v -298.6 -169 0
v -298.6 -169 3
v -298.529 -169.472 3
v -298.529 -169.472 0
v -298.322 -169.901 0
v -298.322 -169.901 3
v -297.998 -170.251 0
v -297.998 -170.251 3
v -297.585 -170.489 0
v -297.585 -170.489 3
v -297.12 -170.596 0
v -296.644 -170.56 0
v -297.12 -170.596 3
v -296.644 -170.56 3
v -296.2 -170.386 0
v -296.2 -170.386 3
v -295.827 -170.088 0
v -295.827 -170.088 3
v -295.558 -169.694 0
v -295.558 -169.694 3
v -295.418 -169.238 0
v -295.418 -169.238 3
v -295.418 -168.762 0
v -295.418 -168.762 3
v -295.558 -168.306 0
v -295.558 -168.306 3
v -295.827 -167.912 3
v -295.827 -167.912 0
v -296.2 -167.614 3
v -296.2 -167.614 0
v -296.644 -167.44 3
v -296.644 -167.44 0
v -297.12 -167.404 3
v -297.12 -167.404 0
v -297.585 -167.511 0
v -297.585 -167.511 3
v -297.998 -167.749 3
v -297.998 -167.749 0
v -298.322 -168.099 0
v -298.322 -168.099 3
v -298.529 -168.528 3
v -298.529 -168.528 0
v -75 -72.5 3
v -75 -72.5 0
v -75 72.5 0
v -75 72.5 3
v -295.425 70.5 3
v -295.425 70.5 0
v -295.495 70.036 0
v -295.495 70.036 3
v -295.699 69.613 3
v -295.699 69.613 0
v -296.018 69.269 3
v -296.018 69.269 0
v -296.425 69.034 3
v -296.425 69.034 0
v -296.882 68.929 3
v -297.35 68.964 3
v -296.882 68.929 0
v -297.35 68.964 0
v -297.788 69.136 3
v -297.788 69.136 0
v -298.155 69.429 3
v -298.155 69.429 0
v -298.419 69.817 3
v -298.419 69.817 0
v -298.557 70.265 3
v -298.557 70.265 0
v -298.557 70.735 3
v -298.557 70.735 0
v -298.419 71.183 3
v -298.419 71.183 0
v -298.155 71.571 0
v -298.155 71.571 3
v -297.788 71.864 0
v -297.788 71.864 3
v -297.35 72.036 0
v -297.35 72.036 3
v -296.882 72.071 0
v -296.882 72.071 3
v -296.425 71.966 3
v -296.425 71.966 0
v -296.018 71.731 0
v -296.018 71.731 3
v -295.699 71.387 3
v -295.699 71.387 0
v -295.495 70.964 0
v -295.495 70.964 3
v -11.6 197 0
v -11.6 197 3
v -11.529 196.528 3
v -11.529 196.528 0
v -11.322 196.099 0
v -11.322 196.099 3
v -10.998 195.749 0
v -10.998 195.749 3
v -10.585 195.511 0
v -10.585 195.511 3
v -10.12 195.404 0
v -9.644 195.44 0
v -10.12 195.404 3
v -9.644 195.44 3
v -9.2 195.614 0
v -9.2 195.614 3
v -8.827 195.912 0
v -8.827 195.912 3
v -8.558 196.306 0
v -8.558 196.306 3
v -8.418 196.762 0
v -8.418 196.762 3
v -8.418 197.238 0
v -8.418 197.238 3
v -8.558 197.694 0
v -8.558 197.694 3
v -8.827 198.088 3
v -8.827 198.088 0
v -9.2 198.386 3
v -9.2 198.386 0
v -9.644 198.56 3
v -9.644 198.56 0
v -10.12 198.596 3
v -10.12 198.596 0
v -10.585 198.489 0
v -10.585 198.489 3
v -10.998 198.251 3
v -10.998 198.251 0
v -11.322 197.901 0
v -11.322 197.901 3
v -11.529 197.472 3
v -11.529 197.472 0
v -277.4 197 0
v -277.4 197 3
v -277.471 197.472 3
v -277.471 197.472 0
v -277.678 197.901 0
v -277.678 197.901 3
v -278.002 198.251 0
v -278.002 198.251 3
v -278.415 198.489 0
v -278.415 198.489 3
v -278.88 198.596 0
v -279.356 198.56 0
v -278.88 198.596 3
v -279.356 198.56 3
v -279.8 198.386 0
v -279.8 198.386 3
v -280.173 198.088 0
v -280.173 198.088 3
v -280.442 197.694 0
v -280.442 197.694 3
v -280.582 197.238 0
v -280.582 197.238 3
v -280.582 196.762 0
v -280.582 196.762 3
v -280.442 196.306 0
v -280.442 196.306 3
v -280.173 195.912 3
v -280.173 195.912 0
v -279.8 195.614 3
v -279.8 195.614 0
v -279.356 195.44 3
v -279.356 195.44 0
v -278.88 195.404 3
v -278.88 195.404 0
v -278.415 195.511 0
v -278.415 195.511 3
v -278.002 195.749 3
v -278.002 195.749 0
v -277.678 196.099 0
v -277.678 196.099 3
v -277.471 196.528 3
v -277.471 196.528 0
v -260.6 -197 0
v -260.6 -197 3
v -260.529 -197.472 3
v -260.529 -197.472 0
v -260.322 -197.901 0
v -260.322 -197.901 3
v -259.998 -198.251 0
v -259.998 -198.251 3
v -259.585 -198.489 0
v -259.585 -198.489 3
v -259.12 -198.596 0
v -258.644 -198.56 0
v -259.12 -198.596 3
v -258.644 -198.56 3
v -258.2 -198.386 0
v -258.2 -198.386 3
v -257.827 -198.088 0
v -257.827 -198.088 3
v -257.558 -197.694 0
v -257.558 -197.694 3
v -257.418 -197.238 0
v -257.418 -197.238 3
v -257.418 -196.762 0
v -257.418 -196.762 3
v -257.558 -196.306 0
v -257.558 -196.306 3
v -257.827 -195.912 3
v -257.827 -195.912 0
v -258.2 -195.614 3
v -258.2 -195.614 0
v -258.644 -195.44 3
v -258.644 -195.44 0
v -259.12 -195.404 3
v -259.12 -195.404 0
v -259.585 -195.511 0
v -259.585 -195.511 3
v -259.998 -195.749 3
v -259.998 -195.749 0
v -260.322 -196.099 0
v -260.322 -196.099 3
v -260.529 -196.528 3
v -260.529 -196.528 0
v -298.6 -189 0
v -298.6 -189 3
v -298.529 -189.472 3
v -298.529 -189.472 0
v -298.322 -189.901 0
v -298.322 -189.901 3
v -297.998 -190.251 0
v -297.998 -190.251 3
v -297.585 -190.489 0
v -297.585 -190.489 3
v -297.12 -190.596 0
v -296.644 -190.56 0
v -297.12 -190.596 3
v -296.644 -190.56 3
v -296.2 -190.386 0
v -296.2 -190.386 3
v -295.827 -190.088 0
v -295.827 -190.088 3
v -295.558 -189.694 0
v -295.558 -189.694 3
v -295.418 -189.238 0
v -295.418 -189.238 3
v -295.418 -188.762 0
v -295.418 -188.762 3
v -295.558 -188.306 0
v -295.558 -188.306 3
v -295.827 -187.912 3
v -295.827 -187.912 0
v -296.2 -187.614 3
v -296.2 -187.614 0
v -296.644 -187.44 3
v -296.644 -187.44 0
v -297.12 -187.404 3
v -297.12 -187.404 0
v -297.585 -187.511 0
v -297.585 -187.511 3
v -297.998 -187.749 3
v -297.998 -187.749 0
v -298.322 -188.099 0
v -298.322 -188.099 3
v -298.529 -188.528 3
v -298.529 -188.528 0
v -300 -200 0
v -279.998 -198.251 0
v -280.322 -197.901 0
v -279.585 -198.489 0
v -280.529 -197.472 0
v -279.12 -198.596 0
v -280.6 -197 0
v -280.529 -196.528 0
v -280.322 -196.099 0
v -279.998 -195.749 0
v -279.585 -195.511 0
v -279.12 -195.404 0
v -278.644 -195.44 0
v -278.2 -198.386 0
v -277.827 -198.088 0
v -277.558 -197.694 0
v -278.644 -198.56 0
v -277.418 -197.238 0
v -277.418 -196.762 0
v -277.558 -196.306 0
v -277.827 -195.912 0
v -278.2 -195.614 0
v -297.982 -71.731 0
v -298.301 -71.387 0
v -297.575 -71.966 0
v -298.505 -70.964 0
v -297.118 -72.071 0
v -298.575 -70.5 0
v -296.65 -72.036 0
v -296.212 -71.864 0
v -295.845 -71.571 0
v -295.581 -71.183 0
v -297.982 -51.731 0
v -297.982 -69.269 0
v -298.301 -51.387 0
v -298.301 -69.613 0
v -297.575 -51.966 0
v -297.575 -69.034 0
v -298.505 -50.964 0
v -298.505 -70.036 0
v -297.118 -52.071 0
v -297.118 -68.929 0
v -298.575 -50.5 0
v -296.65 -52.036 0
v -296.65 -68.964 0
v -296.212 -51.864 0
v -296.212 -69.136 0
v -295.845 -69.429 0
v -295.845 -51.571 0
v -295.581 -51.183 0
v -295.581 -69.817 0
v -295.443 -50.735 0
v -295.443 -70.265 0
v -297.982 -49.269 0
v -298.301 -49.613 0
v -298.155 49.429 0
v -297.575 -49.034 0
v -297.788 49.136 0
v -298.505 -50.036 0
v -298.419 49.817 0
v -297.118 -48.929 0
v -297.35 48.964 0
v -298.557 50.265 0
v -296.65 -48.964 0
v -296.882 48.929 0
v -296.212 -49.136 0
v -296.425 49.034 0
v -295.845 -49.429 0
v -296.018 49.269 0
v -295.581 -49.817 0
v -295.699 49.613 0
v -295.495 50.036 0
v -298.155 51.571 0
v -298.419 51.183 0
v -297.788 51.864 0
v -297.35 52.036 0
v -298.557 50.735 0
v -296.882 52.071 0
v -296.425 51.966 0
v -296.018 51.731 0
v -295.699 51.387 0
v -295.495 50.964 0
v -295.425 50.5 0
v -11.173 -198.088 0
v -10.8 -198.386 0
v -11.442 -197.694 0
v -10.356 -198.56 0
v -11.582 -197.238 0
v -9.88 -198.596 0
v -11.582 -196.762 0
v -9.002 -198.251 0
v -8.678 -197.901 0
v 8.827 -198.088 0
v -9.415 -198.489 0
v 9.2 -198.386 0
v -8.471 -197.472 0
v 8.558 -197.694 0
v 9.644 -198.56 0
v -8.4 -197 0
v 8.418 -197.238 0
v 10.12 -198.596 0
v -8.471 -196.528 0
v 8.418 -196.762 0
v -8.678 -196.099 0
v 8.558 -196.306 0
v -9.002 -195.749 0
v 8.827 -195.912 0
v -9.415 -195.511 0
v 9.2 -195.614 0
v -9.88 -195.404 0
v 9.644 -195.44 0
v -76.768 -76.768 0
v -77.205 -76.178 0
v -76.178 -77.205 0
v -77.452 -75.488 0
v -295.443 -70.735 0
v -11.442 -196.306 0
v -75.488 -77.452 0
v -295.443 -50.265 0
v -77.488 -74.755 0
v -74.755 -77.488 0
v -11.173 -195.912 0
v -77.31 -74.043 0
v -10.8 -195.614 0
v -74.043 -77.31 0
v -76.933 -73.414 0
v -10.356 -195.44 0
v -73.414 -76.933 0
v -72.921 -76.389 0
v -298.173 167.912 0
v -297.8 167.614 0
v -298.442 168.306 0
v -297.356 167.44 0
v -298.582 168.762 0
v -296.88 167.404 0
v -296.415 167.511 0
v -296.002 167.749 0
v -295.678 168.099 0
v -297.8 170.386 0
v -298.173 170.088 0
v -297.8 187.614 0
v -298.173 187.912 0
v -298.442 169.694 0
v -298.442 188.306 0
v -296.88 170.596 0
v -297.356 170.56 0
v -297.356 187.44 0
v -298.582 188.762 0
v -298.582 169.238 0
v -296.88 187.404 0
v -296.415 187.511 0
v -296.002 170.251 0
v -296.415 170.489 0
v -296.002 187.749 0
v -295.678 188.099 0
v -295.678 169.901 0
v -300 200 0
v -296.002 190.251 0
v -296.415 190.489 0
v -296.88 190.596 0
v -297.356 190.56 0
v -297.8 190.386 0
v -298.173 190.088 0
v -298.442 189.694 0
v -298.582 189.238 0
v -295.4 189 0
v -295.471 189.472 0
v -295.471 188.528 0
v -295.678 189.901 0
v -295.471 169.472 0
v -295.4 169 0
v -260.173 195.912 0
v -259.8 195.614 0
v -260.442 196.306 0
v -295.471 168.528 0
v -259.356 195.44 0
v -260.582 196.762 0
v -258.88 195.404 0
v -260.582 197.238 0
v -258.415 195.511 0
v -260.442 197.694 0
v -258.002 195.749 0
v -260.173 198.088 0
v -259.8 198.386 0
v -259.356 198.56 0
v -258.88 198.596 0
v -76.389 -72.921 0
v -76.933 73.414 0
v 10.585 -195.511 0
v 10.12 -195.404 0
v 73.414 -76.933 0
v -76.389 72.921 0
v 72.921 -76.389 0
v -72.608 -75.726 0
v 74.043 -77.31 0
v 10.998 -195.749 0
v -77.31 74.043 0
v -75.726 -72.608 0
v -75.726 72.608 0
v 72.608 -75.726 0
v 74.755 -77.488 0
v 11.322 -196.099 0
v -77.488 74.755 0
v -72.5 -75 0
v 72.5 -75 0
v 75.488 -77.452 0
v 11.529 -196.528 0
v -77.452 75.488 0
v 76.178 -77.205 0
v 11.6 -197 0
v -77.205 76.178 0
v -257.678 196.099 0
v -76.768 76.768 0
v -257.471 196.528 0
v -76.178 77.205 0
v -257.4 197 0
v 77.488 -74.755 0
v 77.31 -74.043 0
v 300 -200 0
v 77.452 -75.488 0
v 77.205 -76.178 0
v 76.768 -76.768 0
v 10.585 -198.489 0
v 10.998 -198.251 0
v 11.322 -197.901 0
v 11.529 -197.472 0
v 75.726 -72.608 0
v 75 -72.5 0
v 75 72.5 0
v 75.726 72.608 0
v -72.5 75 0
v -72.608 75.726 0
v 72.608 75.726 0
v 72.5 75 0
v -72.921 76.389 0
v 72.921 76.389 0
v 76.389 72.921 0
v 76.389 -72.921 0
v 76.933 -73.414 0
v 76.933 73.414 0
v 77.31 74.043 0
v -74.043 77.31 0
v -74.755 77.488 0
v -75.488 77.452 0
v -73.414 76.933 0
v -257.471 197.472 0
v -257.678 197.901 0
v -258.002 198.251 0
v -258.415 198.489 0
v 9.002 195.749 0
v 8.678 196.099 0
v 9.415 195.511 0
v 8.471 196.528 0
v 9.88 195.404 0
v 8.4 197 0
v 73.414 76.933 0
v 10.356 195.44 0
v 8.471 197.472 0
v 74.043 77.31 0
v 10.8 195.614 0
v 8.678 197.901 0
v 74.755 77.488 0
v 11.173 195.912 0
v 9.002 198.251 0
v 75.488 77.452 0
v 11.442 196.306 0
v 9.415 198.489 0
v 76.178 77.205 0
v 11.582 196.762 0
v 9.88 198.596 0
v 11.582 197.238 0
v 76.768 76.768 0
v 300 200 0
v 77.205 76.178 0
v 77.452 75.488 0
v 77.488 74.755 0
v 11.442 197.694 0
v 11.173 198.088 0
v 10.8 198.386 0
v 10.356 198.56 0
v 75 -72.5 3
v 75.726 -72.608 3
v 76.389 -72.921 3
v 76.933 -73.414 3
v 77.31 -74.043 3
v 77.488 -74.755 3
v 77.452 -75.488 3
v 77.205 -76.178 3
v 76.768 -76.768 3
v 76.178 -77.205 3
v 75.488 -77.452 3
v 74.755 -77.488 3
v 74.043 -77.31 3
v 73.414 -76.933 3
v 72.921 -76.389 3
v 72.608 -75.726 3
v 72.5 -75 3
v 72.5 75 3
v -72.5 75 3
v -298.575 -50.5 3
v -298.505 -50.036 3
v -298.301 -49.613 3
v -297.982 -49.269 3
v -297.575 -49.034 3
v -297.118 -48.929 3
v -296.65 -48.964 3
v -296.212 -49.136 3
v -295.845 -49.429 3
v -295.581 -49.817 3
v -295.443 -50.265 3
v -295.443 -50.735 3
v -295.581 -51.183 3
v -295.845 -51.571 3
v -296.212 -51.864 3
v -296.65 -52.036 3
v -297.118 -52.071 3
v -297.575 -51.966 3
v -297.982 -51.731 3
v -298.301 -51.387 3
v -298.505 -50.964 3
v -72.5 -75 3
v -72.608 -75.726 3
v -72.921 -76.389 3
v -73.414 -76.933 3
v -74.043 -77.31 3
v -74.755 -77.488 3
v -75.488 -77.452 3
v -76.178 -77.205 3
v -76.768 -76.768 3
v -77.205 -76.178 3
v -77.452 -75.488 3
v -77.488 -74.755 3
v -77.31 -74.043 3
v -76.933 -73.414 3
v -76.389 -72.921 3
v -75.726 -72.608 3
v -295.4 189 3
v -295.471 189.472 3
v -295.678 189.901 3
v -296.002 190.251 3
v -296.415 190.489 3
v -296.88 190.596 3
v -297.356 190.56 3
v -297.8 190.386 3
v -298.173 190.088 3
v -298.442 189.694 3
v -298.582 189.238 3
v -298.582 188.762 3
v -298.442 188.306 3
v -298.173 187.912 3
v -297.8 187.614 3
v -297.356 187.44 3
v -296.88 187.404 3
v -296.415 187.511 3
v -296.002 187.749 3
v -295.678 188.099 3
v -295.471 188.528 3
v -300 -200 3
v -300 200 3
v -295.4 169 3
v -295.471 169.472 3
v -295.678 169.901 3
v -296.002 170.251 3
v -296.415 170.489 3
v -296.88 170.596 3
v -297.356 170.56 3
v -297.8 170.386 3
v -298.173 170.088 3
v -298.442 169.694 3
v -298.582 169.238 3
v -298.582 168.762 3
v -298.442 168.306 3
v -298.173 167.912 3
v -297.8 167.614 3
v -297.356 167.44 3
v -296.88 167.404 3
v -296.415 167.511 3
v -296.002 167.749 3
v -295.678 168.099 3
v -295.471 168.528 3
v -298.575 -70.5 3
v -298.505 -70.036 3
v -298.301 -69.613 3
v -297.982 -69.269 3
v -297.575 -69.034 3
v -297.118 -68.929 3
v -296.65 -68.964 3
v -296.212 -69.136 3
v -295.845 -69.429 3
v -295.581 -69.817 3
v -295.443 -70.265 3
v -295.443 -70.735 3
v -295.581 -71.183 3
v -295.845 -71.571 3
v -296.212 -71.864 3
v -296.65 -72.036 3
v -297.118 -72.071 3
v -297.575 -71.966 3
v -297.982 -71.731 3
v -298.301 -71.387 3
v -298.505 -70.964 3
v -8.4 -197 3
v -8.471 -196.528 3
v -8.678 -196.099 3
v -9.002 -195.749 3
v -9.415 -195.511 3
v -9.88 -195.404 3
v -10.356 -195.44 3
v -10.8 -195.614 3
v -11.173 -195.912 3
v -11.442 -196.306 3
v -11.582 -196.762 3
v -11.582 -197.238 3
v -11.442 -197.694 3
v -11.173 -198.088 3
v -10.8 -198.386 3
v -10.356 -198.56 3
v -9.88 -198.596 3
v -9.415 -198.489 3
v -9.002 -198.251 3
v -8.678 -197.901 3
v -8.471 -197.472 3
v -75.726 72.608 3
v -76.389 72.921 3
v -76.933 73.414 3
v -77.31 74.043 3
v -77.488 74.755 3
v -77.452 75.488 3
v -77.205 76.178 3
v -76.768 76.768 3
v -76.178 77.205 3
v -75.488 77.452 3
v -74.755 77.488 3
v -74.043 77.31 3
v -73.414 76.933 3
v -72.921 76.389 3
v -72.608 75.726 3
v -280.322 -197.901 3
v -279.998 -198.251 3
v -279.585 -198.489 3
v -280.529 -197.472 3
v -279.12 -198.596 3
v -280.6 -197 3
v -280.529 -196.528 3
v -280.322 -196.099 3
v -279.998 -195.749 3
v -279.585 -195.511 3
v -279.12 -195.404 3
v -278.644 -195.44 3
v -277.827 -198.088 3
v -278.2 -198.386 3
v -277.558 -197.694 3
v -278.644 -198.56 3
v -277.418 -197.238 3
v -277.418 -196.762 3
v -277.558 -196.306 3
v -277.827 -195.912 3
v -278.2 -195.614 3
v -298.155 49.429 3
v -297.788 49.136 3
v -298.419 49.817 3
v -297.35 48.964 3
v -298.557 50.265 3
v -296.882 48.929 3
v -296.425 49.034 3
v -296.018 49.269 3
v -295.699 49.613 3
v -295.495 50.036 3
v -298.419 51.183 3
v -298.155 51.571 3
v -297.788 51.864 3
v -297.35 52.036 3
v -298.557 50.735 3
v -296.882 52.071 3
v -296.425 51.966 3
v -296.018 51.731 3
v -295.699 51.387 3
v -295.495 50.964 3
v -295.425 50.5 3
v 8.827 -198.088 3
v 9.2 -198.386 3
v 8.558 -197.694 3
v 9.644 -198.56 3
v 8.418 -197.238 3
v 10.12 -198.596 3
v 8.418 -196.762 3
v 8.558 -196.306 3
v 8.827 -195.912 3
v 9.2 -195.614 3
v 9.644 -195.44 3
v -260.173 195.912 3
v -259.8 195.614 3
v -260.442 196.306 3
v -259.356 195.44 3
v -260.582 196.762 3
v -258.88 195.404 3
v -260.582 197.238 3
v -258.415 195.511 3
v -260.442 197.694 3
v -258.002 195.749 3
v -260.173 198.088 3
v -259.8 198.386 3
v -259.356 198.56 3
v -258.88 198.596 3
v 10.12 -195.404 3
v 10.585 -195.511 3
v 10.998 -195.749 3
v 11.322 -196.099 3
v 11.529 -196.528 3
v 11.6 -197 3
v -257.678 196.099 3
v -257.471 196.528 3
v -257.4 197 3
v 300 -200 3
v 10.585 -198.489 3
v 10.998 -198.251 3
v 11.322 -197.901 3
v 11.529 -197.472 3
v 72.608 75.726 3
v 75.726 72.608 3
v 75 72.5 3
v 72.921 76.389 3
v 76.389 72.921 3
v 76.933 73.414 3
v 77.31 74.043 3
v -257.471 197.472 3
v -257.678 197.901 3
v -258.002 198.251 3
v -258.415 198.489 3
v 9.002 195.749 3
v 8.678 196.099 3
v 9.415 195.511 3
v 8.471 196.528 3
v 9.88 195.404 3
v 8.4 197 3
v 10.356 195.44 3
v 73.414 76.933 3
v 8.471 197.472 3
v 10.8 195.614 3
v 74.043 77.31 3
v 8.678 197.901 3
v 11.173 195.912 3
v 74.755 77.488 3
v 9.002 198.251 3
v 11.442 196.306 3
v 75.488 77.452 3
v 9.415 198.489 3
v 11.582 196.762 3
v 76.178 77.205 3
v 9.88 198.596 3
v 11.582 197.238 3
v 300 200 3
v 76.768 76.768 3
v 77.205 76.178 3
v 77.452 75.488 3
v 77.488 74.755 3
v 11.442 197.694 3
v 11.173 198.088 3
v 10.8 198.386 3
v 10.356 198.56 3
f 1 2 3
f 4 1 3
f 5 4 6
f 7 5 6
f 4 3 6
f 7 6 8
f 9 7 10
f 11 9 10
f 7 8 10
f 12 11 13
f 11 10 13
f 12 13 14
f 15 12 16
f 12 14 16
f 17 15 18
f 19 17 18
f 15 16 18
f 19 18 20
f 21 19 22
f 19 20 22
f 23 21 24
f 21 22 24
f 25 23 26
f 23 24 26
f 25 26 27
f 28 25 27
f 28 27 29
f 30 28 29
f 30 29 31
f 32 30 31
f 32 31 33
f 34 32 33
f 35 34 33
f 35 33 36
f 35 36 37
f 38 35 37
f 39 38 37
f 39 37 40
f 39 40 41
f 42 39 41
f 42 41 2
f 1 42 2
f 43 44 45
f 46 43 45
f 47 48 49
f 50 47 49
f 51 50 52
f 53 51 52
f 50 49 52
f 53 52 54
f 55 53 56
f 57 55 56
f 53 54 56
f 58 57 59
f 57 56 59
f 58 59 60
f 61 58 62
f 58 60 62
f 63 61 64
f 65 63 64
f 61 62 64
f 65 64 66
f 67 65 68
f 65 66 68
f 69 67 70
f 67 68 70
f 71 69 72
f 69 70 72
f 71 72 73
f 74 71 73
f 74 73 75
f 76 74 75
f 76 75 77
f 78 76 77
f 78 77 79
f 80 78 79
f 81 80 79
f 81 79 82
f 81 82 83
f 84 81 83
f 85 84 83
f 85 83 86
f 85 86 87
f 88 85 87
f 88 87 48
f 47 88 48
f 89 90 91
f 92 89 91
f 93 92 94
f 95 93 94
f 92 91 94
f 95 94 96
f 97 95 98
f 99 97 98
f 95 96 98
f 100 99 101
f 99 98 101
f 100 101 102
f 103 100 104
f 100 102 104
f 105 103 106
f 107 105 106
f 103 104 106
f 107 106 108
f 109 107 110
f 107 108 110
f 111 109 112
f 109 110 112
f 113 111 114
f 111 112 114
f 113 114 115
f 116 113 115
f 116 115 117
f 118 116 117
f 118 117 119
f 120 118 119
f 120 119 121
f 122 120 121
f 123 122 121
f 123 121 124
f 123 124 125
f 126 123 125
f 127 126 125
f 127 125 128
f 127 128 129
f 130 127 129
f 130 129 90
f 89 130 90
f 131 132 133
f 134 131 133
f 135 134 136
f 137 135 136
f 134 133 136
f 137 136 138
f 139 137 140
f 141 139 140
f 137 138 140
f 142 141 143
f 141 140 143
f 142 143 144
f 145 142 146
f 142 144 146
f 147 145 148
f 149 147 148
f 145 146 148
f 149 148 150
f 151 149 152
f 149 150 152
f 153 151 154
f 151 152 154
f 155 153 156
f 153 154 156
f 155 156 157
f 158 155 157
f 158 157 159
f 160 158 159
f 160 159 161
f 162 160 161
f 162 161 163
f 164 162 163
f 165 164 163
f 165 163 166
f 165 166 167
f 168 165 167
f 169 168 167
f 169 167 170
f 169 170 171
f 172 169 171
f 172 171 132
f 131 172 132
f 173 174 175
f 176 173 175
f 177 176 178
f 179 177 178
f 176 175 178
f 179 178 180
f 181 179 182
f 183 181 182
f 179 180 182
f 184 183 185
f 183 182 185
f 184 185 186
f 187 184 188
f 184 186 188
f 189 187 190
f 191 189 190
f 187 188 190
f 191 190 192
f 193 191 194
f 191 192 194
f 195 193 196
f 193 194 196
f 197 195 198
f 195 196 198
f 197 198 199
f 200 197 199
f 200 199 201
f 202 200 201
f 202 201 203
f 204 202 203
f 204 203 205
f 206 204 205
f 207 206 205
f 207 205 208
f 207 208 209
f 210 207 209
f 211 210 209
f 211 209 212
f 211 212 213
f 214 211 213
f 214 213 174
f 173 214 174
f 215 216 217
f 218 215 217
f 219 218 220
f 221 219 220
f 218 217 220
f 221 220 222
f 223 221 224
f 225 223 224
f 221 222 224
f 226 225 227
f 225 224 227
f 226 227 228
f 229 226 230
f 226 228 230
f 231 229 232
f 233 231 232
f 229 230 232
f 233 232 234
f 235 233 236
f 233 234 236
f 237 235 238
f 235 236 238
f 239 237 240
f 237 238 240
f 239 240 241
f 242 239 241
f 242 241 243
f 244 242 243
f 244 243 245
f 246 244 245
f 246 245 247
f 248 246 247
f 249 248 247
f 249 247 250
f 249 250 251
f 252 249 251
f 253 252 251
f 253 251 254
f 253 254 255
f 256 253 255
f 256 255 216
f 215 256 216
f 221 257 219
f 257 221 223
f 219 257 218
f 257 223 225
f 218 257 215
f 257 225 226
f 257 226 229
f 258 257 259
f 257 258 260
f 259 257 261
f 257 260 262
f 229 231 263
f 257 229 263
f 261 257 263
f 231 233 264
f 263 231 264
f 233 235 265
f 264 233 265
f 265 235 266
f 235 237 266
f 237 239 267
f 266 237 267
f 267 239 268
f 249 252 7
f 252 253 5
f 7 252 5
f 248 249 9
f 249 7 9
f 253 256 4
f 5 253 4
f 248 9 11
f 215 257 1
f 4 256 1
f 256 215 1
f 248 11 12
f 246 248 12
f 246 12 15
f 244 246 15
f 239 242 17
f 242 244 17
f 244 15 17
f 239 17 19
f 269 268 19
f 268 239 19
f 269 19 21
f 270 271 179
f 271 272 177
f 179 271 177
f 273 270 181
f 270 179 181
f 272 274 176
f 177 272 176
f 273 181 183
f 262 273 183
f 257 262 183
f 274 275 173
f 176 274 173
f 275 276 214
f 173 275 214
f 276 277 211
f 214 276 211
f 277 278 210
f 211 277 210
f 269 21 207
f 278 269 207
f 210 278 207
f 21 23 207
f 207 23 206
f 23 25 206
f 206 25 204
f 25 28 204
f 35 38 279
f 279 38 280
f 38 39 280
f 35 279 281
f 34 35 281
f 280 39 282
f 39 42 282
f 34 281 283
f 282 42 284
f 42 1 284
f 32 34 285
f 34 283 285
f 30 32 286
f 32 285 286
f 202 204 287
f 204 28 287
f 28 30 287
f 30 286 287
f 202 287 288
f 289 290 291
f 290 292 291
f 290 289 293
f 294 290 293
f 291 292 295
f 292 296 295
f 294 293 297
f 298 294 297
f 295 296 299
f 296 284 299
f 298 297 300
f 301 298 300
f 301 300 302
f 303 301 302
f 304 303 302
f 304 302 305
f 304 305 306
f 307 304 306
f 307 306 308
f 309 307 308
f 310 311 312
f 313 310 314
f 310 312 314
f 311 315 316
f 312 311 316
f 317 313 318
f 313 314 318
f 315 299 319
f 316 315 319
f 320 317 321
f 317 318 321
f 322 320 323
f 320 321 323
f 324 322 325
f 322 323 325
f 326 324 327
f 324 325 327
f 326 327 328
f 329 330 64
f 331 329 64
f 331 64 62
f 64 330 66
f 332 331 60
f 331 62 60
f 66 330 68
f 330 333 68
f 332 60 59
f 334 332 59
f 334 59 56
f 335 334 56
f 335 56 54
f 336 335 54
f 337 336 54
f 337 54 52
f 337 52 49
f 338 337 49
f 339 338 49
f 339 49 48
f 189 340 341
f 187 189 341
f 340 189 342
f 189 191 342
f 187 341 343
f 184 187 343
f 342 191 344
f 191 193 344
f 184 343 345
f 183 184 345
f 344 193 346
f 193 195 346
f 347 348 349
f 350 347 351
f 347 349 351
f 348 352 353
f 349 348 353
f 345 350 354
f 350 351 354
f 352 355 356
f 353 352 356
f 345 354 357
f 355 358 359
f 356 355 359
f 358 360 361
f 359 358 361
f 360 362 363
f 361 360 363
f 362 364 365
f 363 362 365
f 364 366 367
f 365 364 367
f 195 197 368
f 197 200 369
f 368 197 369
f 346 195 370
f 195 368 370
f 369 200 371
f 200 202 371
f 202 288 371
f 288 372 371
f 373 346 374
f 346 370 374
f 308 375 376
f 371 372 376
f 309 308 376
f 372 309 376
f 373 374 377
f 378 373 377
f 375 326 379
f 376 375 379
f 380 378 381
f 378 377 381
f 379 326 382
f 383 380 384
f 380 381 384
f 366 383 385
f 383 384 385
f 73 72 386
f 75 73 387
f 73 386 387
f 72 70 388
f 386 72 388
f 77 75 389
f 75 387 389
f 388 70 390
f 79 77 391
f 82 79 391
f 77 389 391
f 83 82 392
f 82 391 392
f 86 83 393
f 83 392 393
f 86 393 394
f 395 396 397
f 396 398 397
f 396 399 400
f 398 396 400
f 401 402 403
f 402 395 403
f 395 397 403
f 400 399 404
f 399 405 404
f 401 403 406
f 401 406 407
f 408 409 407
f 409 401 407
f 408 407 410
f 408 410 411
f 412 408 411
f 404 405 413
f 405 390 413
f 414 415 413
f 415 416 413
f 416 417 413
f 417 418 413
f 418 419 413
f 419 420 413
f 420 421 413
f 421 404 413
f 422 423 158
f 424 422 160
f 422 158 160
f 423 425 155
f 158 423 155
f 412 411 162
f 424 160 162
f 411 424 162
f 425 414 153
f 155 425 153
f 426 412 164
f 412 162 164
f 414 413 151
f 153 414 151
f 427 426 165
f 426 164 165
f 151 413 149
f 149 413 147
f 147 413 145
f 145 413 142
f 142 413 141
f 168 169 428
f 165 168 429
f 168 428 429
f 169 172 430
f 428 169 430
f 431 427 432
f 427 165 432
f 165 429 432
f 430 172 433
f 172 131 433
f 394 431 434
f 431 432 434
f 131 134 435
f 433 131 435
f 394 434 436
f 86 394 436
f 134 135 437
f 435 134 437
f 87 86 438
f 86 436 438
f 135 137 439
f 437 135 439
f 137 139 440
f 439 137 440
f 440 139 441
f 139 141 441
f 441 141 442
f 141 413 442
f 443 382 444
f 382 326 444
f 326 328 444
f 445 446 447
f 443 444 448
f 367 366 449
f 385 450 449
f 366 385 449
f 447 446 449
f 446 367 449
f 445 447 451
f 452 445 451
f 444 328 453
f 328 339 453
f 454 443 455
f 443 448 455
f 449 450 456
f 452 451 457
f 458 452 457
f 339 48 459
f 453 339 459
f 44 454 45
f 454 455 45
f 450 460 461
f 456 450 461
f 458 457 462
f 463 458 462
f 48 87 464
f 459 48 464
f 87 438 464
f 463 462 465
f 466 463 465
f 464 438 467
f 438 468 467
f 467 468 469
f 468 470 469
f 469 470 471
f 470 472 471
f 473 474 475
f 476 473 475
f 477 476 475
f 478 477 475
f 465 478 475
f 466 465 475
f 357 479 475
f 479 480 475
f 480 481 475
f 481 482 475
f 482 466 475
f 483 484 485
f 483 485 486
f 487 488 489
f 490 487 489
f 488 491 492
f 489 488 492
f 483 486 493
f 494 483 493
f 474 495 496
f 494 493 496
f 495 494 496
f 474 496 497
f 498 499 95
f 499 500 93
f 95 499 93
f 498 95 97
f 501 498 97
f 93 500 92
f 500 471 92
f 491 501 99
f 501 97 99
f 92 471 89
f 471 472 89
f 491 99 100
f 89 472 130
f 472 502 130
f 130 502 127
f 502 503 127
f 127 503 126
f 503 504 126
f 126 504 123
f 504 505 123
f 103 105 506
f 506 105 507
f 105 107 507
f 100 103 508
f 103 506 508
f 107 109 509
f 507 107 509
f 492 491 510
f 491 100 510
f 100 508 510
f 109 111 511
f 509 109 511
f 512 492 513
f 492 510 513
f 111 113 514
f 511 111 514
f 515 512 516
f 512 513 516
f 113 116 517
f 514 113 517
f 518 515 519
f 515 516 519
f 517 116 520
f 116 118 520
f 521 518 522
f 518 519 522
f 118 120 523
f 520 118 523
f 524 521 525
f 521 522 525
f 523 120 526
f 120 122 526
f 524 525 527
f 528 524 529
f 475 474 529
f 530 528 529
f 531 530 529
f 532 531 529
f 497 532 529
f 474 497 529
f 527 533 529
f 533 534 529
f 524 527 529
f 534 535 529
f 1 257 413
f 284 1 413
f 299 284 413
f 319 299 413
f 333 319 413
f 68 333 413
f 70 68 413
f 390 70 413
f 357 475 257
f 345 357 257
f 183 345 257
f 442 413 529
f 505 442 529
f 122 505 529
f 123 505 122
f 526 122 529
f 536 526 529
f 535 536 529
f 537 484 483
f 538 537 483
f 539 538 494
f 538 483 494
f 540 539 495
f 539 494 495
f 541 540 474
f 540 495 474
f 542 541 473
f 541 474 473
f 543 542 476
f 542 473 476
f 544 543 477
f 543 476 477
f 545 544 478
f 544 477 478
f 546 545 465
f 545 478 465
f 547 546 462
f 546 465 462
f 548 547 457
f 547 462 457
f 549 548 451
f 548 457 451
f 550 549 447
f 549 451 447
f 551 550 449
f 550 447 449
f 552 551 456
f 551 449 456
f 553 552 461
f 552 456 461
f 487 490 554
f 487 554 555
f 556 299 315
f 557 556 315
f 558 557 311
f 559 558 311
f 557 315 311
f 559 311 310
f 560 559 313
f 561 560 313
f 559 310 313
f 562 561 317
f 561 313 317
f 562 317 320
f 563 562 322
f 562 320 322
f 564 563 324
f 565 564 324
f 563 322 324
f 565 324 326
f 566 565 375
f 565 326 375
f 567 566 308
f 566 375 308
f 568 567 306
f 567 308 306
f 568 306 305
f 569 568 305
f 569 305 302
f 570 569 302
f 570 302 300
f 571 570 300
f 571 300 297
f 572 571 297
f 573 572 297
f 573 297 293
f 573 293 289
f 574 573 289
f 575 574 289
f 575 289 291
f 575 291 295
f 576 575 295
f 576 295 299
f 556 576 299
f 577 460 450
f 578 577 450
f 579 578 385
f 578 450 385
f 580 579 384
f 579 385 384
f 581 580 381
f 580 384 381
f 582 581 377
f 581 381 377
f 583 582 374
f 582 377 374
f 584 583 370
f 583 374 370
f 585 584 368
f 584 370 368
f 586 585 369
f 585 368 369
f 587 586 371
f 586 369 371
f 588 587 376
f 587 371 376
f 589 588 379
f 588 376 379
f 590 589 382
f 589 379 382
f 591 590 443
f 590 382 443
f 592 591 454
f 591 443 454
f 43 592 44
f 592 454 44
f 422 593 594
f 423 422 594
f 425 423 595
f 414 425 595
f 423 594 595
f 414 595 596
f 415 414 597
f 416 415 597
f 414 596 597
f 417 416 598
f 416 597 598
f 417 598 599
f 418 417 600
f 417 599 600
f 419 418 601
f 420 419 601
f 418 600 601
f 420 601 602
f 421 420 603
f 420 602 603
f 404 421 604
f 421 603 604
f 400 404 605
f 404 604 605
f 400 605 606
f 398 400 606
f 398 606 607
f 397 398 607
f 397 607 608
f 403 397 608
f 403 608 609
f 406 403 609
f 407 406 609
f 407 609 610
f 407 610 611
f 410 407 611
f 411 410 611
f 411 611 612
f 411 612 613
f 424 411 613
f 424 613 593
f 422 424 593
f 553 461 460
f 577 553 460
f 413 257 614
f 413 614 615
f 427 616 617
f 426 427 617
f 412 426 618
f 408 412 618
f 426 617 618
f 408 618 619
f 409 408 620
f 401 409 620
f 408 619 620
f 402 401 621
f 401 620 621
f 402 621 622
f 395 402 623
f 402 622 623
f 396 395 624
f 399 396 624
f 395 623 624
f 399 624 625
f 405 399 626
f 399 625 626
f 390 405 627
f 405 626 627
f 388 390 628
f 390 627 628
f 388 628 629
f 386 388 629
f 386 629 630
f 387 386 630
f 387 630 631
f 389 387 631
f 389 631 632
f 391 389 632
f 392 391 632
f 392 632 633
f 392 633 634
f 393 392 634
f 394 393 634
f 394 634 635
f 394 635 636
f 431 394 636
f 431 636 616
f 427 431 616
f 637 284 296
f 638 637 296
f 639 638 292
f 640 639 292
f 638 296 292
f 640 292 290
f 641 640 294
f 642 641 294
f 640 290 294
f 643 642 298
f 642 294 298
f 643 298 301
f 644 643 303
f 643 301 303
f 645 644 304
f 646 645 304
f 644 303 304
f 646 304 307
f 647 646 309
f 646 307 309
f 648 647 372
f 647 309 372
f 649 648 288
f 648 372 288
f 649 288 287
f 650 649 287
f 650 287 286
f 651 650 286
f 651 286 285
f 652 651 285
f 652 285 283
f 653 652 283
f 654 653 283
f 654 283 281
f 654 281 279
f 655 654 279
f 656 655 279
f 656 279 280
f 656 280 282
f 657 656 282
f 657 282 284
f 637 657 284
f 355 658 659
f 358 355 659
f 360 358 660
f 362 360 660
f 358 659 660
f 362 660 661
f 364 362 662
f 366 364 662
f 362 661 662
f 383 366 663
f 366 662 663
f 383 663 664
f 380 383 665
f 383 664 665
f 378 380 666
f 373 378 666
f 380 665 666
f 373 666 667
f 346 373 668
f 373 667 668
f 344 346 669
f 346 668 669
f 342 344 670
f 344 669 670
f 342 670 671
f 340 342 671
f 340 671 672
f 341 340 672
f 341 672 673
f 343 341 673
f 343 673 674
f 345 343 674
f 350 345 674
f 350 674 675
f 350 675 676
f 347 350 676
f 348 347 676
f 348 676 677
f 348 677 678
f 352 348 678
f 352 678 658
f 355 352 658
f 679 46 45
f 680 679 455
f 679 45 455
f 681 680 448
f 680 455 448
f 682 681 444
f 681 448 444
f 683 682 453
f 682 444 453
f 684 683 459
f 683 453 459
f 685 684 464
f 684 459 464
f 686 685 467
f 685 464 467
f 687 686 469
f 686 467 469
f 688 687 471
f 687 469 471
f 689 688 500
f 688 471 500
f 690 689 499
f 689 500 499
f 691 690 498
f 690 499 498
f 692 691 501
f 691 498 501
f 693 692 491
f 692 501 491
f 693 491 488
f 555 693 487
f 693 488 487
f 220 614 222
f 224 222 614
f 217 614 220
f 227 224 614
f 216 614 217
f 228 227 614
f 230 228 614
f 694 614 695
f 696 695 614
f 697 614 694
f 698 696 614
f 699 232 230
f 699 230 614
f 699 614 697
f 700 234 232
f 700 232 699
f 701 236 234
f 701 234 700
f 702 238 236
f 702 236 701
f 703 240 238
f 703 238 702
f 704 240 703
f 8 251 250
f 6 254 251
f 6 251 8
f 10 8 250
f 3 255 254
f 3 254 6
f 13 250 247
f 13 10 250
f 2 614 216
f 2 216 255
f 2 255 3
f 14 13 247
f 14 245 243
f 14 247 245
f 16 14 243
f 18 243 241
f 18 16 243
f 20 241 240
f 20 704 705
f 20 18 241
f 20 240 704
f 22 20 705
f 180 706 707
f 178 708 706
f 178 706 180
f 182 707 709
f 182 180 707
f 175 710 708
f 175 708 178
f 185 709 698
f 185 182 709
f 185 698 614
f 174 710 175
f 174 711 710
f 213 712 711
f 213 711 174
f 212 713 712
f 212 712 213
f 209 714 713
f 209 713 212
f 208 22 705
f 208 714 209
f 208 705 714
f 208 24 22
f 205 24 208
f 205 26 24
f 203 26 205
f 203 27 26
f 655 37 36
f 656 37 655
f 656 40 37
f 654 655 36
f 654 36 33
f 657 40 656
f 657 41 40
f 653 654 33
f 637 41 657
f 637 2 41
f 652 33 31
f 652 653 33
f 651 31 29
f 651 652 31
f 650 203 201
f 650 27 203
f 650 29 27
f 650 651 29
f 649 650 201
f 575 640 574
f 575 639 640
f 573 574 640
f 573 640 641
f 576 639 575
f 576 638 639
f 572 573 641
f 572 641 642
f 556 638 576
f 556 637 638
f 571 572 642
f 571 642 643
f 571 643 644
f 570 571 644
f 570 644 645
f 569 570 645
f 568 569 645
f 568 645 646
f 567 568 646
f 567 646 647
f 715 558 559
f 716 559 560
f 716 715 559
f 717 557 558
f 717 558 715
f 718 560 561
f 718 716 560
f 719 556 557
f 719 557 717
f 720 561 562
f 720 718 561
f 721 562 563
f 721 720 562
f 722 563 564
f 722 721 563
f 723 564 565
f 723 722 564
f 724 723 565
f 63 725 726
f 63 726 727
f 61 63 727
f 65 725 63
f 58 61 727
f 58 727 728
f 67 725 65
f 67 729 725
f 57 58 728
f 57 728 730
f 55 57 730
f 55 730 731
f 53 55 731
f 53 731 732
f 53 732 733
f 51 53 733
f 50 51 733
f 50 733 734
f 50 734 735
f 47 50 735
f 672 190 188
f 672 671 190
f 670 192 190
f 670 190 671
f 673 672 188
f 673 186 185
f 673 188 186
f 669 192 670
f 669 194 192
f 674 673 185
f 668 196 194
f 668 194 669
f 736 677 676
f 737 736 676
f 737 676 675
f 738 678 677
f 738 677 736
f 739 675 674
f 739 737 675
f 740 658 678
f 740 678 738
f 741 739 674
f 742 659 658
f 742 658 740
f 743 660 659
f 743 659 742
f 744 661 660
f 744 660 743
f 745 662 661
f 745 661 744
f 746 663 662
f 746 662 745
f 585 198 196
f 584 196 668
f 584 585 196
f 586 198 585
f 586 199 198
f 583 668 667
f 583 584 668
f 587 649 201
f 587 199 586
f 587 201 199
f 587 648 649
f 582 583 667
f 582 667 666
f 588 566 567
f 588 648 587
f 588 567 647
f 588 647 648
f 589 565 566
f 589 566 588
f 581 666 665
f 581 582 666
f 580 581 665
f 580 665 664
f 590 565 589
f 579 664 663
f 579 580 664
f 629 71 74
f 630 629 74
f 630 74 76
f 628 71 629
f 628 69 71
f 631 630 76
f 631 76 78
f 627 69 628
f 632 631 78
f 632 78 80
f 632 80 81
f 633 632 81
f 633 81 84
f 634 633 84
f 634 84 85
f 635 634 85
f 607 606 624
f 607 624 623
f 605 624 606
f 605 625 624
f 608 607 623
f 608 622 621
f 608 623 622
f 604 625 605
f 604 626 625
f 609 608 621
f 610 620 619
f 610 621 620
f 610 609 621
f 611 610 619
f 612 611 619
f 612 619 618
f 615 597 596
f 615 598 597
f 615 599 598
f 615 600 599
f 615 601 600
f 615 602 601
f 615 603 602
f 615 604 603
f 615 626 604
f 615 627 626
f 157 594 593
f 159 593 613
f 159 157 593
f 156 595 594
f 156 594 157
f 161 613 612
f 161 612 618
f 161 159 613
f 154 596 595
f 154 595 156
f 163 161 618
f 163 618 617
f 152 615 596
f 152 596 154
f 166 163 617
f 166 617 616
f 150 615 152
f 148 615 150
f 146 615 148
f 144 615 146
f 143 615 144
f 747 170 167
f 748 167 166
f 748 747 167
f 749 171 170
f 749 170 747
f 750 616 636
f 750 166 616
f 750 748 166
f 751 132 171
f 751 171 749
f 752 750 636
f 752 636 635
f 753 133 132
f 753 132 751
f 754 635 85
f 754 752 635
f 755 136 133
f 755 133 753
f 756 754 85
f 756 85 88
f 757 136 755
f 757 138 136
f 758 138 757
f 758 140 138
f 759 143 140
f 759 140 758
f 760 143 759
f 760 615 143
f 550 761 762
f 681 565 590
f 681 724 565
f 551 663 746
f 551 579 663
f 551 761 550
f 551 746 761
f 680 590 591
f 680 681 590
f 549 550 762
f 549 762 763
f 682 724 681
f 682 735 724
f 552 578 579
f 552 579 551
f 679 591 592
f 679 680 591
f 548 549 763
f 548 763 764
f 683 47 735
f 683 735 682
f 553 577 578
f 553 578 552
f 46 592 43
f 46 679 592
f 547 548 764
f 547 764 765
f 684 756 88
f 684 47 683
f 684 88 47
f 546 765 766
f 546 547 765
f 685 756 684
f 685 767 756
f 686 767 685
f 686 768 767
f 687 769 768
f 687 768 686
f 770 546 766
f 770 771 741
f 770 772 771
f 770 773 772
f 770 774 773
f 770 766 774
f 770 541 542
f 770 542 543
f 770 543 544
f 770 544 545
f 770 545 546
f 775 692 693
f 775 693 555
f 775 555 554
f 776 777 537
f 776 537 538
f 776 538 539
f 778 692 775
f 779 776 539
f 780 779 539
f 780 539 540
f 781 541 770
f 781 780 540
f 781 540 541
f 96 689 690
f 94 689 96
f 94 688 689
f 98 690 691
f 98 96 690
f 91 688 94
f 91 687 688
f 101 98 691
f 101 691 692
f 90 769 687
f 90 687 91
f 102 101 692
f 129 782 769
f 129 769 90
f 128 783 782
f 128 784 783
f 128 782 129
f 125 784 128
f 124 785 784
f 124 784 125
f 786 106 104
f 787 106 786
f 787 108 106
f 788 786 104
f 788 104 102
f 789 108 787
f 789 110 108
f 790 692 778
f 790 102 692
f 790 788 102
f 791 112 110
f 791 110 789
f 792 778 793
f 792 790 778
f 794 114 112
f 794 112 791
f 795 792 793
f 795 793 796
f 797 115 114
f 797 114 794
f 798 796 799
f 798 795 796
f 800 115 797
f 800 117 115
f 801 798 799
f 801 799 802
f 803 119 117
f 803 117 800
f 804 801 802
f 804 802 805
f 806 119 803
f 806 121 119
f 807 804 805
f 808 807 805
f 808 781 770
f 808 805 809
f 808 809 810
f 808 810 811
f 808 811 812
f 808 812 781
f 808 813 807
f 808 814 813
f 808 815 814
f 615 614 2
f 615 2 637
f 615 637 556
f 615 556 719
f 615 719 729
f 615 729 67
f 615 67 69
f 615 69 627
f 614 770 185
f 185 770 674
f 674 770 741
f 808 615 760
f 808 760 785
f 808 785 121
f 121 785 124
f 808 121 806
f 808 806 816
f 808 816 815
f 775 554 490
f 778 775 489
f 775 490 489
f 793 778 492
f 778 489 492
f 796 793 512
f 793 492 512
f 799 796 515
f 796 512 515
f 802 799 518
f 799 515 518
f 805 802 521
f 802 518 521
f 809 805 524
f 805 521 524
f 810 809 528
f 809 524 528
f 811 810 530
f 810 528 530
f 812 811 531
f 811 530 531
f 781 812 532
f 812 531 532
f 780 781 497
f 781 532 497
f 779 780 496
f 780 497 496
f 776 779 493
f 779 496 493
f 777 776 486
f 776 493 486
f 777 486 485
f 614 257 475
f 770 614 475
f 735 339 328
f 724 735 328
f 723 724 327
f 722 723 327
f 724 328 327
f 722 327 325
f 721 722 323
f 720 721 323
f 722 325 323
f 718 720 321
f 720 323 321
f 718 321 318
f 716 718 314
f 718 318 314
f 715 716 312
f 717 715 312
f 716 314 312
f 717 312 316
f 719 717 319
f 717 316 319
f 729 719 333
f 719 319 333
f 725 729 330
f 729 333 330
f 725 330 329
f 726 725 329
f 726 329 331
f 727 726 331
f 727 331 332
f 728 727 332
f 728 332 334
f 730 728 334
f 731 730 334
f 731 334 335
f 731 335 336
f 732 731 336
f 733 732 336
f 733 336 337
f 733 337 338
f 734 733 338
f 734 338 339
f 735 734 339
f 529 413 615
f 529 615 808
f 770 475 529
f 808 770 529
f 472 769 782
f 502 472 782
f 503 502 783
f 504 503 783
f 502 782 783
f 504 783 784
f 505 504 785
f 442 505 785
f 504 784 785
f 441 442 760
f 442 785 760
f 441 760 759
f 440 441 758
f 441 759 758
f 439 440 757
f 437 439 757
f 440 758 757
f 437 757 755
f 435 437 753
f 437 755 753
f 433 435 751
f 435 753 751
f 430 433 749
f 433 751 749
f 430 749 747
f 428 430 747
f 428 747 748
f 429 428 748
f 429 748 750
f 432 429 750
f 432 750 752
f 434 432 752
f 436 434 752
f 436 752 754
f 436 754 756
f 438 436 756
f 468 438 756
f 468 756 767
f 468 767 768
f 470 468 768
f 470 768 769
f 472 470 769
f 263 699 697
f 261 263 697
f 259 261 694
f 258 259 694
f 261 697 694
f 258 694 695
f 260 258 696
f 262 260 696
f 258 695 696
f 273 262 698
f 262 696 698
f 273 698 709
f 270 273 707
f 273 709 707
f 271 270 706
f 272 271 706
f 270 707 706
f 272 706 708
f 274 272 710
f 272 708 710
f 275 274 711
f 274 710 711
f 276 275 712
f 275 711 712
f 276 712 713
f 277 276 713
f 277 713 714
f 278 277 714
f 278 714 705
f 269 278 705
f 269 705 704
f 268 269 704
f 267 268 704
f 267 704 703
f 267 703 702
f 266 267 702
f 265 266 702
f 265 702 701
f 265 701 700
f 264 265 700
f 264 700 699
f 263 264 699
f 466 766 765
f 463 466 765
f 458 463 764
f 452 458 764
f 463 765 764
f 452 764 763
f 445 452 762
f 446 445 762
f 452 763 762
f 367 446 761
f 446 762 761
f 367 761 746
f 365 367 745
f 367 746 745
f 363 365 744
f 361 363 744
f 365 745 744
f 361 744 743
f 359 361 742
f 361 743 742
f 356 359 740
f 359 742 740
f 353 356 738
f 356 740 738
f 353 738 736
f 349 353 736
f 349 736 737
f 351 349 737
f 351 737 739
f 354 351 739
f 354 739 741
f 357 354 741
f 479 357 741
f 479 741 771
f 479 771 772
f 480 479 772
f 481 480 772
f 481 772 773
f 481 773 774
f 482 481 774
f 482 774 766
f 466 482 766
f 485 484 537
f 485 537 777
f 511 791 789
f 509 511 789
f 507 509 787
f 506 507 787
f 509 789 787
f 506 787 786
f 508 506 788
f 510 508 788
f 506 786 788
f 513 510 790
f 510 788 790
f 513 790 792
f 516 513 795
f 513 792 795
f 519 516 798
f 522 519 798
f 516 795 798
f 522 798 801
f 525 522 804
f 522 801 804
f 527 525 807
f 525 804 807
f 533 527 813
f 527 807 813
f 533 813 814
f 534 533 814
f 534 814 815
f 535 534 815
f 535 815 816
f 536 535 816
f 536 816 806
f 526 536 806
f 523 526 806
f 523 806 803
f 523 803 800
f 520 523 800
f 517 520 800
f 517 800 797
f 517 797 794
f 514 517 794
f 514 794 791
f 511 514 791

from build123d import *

# Parameters (mm, degrees)
SKETCH_1_W          = 600
SKETCH_1_H          = 400
EXTRUDE_1_DEPTH     = 3
SKETCH_2_R          = 1.6
CUT_EXTRUDE_1_DEPTH = 361.567608085
SKETCH_3_R          = 1.6
CUT_EXTRUDE_2_DEPTH = 361.567608085
SKETCH_4_W          = 150
SKETCH_4_H          = 150
CUT_EXTRUDE_3_DEPTH = 361.567608085
SKETCH_5_R          = 2.5
CUT_EXTRUDE_4_DEPTH = 361.567608085
SKETCH_6_R          = 1.575
CUT_EXTRUDE_5_DEPTH = 361.567608085


with BuildPart() as part:
    # 草图1 → 凸台-拉伸1 (new body)
    with BuildSketch(Plane.XY):
        Rectangle(SKETCH_1_W, SKETCH_1_H)
    extrude(amount=EXTRUDE_1_DEPTH)

    # 草图2 → 切除-拉伸1 (cut, through all)
    with BuildSketch(Plane.XY.offset(3)):
        with Locations((-10, -197)):
            Circle(SKETCH_2_R)
        with Locations((10, -197)):
            Circle(SKETCH_2_R)
        with Locations(Location((10, 197, 0), (0, 0, 180))):
            Circle(SKETCH_2_R)
        with Locations(Location((-10, 197, 0), (0, 0, 180))):
            Circle(SKETCH_2_R)
    extrude(amount=-CUT_EXTRUDE_1_DEPTH, mode=Mode.SUBTRACT)

    # 草图3 → 切除-拉伸2 (cut, through all)
    with BuildSketch(Plane.XY.offset(3)):
        with Locations((-297, 169)):
            Circle(SKETCH_3_R)
        with Locations((-297, 189)):
            Circle(SKETCH_3_R)
        with Locations((-279, 197)):
            Circle(SKETCH_3_R)
        with Locations((-259, 197)):
            Circle(SKETCH_3_R)
        with Locations(Location((-259, -197, 0), (0, 0, 180))):
            Circle(SKETCH_3_R)
        with Locations(Location((-279, -197, 0), (0, 0, 180))):
            Circle(SKETCH_3_R)
        with Locations(Location((-297, -189, 0), (0, 0, 180))):
            Circle(SKETCH_3_R)
        with Locations(Location((-297, -169, 0), (0, 0, 180))):
            Circle(SKETCH_3_R)
    extrude(amount=-CUT_EXTRUDE_2_DEPTH, mode=Mode.SUBTRACT)

    # 草图4 → 切除-拉伸3 (cut, through all)
    with BuildSketch(Plane(origin=(0, 0, 0), x_dir=(-1, 0, 0), z_dir=(0, 0, -1))):
        Rectangle(SKETCH_4_W, SKETCH_4_H)
    extrude(amount=-CUT_EXTRUDE_3_DEPTH, mode=Mode.SUBTRACT)

    # 草图5 → 切除-拉伸4 (cut, through all)
    with BuildSketch(Plane(origin=(0, 0, 0), x_dir=(-1, 0, 0), z_dir=(0, 0, -1))):
        with Locations((75, 75)):
            Circle(SKETCH_5_R)
        with Locations((75, -75)):
            Circle(SKETCH_5_R)
        with Locations((-75, -75)):
            Circle(SKETCH_5_R)
        with Locations((-75, 75)):
            Circle(SKETCH_5_R)
    extrude(amount=-CUT_EXTRUDE_4_DEPTH, mode=Mode.SUBTRACT)

    # 草图6 → 切除-拉伸5 (cut, through all)
    with BuildSketch(Plane(origin=(0, 0, 0), x_dir=(-1, 0, 0), z_dir=(0, 0, -1))):
        with Locations((297, -50.5)):
            Circle(SKETCH_6_R)
        with Locations((297, -70.5)):
            Circle(SKETCH_6_R)
        with Locations(Location((297, 70.5, 0), (0, 0, 180))):
            Circle(SKETCH_6_R)
        with Locations(Location((297, 50.5, 0), (0, 0, 180))):
            Circle(SKETCH_6_R)
    extrude(amount=-CUT_EXTRUDE_5_DEPTH, mode=Mode.SUBTRACT)


solid = part.part
